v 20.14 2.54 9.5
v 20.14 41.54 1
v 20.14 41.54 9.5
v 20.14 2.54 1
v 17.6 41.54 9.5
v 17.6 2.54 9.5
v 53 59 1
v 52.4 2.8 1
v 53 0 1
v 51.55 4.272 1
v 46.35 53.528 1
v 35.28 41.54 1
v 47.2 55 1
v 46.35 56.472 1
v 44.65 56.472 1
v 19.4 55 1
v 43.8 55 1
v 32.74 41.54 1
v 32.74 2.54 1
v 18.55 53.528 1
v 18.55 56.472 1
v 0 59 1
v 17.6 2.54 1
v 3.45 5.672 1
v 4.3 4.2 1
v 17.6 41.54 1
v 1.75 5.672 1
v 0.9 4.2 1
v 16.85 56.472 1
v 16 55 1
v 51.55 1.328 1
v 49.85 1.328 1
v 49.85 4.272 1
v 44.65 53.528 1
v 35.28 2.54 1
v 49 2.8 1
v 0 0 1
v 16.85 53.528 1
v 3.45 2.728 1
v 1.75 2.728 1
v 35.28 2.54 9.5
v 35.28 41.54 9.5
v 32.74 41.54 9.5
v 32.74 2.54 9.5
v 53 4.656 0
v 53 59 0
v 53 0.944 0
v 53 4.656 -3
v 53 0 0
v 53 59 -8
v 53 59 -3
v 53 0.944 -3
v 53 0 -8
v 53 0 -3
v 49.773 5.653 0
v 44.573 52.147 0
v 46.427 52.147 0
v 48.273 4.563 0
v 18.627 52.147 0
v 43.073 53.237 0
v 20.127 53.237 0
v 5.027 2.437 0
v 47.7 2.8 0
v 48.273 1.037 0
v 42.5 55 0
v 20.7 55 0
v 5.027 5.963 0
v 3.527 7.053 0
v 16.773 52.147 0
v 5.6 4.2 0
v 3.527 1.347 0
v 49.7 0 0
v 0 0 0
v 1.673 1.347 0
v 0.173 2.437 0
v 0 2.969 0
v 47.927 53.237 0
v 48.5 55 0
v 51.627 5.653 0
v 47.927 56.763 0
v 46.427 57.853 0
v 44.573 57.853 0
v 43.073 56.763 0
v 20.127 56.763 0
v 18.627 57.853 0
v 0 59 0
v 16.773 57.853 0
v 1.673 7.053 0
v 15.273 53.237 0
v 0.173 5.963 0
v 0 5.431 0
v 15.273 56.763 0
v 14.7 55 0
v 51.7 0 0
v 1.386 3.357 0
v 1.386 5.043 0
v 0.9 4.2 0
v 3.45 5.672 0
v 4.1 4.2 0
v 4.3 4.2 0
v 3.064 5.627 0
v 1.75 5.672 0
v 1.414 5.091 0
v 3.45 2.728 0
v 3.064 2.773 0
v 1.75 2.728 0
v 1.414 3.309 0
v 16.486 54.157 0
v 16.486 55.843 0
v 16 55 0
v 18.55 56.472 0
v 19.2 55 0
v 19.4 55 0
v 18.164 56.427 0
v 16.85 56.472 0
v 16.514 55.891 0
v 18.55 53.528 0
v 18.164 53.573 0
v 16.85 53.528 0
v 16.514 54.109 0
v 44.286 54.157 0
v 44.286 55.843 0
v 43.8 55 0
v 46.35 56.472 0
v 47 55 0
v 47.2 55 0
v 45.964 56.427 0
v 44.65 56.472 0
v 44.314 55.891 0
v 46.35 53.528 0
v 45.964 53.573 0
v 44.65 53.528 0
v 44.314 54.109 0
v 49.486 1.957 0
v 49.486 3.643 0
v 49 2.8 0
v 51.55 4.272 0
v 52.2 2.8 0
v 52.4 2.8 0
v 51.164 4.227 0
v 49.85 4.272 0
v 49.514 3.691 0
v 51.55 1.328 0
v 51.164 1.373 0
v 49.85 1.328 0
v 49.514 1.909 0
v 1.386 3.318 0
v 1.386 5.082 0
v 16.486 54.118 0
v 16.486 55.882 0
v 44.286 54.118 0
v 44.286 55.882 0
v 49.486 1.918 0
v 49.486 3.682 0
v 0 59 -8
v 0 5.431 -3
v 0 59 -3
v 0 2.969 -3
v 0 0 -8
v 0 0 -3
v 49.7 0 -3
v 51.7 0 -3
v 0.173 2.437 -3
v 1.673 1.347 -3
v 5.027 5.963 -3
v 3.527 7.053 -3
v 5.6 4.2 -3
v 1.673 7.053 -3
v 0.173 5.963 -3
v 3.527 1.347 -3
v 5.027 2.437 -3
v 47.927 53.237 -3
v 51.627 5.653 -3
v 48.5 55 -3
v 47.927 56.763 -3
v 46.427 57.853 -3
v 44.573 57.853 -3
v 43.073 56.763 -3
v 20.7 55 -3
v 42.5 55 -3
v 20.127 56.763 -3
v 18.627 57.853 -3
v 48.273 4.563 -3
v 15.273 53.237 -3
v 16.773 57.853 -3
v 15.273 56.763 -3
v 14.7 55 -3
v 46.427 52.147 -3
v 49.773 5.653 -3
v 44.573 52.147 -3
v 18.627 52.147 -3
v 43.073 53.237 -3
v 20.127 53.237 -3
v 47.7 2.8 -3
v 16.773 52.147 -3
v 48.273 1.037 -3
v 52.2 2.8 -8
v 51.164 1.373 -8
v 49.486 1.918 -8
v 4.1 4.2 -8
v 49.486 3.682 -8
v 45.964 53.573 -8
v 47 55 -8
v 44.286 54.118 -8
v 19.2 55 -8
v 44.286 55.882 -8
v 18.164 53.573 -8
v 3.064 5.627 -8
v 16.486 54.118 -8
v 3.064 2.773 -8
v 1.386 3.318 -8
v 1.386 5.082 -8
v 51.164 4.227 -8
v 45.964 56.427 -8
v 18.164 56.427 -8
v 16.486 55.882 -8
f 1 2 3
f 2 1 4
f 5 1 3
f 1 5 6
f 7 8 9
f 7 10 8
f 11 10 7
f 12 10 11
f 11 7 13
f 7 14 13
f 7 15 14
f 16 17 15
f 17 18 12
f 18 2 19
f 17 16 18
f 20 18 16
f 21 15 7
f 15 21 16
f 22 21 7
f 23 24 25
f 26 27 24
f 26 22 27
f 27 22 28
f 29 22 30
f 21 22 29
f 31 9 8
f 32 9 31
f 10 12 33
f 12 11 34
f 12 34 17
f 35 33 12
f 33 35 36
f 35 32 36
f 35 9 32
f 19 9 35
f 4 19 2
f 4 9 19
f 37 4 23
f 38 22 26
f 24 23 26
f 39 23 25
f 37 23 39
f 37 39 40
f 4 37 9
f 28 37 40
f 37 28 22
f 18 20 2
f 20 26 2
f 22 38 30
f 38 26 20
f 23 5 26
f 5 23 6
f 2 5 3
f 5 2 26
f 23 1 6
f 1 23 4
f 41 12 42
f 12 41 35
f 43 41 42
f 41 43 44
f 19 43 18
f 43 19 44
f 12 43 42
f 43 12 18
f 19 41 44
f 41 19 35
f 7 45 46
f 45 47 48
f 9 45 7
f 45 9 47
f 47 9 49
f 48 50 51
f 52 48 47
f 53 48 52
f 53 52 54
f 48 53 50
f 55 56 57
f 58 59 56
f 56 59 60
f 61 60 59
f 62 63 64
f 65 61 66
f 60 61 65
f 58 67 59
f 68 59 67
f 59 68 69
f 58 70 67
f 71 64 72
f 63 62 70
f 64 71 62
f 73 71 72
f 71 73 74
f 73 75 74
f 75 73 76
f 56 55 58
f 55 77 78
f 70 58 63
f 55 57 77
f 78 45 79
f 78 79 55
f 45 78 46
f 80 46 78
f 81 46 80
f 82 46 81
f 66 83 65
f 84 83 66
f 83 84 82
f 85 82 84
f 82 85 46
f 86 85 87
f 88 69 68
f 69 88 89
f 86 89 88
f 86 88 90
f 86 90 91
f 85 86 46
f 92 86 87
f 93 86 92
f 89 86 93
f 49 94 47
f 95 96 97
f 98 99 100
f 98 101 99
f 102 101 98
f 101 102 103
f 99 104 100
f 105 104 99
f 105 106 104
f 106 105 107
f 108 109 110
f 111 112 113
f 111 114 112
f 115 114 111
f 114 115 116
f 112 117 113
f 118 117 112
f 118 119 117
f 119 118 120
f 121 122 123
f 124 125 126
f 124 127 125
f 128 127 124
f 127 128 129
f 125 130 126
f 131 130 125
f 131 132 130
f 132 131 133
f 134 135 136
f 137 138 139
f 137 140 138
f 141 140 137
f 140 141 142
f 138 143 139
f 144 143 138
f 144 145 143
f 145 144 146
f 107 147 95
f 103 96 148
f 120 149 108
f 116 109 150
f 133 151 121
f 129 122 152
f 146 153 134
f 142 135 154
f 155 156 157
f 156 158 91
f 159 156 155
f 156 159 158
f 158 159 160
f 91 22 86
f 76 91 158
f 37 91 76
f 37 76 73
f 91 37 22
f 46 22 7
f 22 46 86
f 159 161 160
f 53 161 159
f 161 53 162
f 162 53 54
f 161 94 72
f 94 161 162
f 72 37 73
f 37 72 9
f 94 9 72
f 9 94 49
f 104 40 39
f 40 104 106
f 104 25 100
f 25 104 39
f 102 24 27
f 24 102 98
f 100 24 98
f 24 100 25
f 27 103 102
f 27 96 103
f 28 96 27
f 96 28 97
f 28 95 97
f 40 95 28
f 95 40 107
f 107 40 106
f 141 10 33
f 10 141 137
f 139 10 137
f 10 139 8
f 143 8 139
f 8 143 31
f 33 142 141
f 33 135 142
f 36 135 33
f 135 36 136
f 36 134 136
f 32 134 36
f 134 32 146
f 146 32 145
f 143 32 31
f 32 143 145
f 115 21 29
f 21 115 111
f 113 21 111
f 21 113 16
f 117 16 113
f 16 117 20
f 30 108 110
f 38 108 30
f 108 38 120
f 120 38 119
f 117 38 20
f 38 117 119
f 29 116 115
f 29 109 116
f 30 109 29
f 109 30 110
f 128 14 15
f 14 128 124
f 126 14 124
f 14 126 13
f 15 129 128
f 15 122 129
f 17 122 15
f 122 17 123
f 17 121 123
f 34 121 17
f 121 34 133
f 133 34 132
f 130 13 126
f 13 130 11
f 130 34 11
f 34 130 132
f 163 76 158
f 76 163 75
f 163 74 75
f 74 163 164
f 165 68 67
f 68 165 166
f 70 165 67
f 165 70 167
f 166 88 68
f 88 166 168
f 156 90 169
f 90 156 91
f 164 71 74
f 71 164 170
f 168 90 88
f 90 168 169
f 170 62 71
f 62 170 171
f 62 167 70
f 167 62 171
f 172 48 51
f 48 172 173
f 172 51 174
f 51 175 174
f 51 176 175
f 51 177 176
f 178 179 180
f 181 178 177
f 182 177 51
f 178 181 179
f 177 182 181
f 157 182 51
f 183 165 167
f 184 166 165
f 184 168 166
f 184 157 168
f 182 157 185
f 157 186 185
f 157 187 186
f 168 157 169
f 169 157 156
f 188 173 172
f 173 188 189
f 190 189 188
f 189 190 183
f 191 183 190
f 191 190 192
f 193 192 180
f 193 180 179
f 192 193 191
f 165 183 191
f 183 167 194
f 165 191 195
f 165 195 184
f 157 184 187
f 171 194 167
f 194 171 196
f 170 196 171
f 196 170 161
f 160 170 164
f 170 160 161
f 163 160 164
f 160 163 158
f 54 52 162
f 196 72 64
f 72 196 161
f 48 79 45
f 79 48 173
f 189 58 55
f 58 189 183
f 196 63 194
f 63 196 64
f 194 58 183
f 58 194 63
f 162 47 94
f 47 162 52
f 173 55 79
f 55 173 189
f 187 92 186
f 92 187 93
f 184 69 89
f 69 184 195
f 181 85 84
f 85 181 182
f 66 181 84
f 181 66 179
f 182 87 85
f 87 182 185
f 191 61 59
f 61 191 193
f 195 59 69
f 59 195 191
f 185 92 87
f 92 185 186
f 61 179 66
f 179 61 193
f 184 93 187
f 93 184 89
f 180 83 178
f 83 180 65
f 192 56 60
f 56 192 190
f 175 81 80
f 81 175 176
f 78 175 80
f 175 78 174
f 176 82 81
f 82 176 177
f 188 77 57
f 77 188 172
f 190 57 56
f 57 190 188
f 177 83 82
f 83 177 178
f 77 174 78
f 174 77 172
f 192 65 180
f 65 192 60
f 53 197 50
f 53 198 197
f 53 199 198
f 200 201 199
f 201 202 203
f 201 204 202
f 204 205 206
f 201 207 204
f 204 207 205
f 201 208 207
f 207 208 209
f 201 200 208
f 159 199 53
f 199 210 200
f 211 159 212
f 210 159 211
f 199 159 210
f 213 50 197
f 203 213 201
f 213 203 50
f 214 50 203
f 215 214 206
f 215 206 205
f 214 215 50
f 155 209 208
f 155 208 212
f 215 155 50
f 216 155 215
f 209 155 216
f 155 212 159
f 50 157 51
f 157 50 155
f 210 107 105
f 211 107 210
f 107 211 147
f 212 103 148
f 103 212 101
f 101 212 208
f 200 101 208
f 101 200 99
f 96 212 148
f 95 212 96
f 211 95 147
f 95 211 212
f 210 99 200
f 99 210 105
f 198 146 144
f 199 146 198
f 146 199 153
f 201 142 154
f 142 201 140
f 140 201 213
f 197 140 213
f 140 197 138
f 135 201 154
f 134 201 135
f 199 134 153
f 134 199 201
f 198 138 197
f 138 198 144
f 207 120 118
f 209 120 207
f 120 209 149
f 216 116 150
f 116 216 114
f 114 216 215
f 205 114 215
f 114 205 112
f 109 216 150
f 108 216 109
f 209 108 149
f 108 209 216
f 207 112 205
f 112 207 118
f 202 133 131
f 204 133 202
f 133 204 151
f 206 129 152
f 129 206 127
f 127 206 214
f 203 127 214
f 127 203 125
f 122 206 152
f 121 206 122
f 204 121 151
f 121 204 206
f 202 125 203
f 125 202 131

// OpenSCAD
module dkNano003Body(){
    //pcb max dimensions, not the contour
    color([0,0,0.5])
        cube([53, 59, 1]);
    //socket headers for ardiuno
    color([0,0,0]){
        translate([17.6, 2.54,1]){
            cube([2.54, 39, 8.5]);
            translate([2.54+12.6, 0, 0])
                cube([2.54, 39, 8.5]);
        }
    }
}

module dkNano003HolePattern(r,h){
    rr = 3.4/2;
    translate([0.9+rr, 2.5+rr, 0]){
        cylinder(h, r, r);
    }
    
    translate([49+rr, 1.1+rr, 0]){
        cylinder(h, r, r);
    }
    
    translate([16+rr, 53.3+rr, 0]){
        cylinder(h, r, r);
    }
    
    translate([43.8+rr, 53.3+rr, 0]){
        cylinder(h, r, r);
    }
}

module dkNano003Module(){
    difference(){
        dkNano003Body();
        translate([0, 0, -1])
            dkNano003HolePattern(3.4/2, 3);
    }
}

module dkNano003Fixture(r, th){
    difference(){
        intersection(){
            translate([0,0,-3]){
                dkNano003HolePattern(6/2, 3);
                translate([0,0,-th])
                    cube([53, 59, th]);
            }
            translate([0, 0, 0-3-th])
                cube([53, 59, th+3+0.5]);
        }
        
        translate([0, 0, 0-3-th-1])
            dkNano003HolePattern(r, 3+th+2);
        }
}
dkNano003Module();
dkNano003Fixture(3/2, 5);
